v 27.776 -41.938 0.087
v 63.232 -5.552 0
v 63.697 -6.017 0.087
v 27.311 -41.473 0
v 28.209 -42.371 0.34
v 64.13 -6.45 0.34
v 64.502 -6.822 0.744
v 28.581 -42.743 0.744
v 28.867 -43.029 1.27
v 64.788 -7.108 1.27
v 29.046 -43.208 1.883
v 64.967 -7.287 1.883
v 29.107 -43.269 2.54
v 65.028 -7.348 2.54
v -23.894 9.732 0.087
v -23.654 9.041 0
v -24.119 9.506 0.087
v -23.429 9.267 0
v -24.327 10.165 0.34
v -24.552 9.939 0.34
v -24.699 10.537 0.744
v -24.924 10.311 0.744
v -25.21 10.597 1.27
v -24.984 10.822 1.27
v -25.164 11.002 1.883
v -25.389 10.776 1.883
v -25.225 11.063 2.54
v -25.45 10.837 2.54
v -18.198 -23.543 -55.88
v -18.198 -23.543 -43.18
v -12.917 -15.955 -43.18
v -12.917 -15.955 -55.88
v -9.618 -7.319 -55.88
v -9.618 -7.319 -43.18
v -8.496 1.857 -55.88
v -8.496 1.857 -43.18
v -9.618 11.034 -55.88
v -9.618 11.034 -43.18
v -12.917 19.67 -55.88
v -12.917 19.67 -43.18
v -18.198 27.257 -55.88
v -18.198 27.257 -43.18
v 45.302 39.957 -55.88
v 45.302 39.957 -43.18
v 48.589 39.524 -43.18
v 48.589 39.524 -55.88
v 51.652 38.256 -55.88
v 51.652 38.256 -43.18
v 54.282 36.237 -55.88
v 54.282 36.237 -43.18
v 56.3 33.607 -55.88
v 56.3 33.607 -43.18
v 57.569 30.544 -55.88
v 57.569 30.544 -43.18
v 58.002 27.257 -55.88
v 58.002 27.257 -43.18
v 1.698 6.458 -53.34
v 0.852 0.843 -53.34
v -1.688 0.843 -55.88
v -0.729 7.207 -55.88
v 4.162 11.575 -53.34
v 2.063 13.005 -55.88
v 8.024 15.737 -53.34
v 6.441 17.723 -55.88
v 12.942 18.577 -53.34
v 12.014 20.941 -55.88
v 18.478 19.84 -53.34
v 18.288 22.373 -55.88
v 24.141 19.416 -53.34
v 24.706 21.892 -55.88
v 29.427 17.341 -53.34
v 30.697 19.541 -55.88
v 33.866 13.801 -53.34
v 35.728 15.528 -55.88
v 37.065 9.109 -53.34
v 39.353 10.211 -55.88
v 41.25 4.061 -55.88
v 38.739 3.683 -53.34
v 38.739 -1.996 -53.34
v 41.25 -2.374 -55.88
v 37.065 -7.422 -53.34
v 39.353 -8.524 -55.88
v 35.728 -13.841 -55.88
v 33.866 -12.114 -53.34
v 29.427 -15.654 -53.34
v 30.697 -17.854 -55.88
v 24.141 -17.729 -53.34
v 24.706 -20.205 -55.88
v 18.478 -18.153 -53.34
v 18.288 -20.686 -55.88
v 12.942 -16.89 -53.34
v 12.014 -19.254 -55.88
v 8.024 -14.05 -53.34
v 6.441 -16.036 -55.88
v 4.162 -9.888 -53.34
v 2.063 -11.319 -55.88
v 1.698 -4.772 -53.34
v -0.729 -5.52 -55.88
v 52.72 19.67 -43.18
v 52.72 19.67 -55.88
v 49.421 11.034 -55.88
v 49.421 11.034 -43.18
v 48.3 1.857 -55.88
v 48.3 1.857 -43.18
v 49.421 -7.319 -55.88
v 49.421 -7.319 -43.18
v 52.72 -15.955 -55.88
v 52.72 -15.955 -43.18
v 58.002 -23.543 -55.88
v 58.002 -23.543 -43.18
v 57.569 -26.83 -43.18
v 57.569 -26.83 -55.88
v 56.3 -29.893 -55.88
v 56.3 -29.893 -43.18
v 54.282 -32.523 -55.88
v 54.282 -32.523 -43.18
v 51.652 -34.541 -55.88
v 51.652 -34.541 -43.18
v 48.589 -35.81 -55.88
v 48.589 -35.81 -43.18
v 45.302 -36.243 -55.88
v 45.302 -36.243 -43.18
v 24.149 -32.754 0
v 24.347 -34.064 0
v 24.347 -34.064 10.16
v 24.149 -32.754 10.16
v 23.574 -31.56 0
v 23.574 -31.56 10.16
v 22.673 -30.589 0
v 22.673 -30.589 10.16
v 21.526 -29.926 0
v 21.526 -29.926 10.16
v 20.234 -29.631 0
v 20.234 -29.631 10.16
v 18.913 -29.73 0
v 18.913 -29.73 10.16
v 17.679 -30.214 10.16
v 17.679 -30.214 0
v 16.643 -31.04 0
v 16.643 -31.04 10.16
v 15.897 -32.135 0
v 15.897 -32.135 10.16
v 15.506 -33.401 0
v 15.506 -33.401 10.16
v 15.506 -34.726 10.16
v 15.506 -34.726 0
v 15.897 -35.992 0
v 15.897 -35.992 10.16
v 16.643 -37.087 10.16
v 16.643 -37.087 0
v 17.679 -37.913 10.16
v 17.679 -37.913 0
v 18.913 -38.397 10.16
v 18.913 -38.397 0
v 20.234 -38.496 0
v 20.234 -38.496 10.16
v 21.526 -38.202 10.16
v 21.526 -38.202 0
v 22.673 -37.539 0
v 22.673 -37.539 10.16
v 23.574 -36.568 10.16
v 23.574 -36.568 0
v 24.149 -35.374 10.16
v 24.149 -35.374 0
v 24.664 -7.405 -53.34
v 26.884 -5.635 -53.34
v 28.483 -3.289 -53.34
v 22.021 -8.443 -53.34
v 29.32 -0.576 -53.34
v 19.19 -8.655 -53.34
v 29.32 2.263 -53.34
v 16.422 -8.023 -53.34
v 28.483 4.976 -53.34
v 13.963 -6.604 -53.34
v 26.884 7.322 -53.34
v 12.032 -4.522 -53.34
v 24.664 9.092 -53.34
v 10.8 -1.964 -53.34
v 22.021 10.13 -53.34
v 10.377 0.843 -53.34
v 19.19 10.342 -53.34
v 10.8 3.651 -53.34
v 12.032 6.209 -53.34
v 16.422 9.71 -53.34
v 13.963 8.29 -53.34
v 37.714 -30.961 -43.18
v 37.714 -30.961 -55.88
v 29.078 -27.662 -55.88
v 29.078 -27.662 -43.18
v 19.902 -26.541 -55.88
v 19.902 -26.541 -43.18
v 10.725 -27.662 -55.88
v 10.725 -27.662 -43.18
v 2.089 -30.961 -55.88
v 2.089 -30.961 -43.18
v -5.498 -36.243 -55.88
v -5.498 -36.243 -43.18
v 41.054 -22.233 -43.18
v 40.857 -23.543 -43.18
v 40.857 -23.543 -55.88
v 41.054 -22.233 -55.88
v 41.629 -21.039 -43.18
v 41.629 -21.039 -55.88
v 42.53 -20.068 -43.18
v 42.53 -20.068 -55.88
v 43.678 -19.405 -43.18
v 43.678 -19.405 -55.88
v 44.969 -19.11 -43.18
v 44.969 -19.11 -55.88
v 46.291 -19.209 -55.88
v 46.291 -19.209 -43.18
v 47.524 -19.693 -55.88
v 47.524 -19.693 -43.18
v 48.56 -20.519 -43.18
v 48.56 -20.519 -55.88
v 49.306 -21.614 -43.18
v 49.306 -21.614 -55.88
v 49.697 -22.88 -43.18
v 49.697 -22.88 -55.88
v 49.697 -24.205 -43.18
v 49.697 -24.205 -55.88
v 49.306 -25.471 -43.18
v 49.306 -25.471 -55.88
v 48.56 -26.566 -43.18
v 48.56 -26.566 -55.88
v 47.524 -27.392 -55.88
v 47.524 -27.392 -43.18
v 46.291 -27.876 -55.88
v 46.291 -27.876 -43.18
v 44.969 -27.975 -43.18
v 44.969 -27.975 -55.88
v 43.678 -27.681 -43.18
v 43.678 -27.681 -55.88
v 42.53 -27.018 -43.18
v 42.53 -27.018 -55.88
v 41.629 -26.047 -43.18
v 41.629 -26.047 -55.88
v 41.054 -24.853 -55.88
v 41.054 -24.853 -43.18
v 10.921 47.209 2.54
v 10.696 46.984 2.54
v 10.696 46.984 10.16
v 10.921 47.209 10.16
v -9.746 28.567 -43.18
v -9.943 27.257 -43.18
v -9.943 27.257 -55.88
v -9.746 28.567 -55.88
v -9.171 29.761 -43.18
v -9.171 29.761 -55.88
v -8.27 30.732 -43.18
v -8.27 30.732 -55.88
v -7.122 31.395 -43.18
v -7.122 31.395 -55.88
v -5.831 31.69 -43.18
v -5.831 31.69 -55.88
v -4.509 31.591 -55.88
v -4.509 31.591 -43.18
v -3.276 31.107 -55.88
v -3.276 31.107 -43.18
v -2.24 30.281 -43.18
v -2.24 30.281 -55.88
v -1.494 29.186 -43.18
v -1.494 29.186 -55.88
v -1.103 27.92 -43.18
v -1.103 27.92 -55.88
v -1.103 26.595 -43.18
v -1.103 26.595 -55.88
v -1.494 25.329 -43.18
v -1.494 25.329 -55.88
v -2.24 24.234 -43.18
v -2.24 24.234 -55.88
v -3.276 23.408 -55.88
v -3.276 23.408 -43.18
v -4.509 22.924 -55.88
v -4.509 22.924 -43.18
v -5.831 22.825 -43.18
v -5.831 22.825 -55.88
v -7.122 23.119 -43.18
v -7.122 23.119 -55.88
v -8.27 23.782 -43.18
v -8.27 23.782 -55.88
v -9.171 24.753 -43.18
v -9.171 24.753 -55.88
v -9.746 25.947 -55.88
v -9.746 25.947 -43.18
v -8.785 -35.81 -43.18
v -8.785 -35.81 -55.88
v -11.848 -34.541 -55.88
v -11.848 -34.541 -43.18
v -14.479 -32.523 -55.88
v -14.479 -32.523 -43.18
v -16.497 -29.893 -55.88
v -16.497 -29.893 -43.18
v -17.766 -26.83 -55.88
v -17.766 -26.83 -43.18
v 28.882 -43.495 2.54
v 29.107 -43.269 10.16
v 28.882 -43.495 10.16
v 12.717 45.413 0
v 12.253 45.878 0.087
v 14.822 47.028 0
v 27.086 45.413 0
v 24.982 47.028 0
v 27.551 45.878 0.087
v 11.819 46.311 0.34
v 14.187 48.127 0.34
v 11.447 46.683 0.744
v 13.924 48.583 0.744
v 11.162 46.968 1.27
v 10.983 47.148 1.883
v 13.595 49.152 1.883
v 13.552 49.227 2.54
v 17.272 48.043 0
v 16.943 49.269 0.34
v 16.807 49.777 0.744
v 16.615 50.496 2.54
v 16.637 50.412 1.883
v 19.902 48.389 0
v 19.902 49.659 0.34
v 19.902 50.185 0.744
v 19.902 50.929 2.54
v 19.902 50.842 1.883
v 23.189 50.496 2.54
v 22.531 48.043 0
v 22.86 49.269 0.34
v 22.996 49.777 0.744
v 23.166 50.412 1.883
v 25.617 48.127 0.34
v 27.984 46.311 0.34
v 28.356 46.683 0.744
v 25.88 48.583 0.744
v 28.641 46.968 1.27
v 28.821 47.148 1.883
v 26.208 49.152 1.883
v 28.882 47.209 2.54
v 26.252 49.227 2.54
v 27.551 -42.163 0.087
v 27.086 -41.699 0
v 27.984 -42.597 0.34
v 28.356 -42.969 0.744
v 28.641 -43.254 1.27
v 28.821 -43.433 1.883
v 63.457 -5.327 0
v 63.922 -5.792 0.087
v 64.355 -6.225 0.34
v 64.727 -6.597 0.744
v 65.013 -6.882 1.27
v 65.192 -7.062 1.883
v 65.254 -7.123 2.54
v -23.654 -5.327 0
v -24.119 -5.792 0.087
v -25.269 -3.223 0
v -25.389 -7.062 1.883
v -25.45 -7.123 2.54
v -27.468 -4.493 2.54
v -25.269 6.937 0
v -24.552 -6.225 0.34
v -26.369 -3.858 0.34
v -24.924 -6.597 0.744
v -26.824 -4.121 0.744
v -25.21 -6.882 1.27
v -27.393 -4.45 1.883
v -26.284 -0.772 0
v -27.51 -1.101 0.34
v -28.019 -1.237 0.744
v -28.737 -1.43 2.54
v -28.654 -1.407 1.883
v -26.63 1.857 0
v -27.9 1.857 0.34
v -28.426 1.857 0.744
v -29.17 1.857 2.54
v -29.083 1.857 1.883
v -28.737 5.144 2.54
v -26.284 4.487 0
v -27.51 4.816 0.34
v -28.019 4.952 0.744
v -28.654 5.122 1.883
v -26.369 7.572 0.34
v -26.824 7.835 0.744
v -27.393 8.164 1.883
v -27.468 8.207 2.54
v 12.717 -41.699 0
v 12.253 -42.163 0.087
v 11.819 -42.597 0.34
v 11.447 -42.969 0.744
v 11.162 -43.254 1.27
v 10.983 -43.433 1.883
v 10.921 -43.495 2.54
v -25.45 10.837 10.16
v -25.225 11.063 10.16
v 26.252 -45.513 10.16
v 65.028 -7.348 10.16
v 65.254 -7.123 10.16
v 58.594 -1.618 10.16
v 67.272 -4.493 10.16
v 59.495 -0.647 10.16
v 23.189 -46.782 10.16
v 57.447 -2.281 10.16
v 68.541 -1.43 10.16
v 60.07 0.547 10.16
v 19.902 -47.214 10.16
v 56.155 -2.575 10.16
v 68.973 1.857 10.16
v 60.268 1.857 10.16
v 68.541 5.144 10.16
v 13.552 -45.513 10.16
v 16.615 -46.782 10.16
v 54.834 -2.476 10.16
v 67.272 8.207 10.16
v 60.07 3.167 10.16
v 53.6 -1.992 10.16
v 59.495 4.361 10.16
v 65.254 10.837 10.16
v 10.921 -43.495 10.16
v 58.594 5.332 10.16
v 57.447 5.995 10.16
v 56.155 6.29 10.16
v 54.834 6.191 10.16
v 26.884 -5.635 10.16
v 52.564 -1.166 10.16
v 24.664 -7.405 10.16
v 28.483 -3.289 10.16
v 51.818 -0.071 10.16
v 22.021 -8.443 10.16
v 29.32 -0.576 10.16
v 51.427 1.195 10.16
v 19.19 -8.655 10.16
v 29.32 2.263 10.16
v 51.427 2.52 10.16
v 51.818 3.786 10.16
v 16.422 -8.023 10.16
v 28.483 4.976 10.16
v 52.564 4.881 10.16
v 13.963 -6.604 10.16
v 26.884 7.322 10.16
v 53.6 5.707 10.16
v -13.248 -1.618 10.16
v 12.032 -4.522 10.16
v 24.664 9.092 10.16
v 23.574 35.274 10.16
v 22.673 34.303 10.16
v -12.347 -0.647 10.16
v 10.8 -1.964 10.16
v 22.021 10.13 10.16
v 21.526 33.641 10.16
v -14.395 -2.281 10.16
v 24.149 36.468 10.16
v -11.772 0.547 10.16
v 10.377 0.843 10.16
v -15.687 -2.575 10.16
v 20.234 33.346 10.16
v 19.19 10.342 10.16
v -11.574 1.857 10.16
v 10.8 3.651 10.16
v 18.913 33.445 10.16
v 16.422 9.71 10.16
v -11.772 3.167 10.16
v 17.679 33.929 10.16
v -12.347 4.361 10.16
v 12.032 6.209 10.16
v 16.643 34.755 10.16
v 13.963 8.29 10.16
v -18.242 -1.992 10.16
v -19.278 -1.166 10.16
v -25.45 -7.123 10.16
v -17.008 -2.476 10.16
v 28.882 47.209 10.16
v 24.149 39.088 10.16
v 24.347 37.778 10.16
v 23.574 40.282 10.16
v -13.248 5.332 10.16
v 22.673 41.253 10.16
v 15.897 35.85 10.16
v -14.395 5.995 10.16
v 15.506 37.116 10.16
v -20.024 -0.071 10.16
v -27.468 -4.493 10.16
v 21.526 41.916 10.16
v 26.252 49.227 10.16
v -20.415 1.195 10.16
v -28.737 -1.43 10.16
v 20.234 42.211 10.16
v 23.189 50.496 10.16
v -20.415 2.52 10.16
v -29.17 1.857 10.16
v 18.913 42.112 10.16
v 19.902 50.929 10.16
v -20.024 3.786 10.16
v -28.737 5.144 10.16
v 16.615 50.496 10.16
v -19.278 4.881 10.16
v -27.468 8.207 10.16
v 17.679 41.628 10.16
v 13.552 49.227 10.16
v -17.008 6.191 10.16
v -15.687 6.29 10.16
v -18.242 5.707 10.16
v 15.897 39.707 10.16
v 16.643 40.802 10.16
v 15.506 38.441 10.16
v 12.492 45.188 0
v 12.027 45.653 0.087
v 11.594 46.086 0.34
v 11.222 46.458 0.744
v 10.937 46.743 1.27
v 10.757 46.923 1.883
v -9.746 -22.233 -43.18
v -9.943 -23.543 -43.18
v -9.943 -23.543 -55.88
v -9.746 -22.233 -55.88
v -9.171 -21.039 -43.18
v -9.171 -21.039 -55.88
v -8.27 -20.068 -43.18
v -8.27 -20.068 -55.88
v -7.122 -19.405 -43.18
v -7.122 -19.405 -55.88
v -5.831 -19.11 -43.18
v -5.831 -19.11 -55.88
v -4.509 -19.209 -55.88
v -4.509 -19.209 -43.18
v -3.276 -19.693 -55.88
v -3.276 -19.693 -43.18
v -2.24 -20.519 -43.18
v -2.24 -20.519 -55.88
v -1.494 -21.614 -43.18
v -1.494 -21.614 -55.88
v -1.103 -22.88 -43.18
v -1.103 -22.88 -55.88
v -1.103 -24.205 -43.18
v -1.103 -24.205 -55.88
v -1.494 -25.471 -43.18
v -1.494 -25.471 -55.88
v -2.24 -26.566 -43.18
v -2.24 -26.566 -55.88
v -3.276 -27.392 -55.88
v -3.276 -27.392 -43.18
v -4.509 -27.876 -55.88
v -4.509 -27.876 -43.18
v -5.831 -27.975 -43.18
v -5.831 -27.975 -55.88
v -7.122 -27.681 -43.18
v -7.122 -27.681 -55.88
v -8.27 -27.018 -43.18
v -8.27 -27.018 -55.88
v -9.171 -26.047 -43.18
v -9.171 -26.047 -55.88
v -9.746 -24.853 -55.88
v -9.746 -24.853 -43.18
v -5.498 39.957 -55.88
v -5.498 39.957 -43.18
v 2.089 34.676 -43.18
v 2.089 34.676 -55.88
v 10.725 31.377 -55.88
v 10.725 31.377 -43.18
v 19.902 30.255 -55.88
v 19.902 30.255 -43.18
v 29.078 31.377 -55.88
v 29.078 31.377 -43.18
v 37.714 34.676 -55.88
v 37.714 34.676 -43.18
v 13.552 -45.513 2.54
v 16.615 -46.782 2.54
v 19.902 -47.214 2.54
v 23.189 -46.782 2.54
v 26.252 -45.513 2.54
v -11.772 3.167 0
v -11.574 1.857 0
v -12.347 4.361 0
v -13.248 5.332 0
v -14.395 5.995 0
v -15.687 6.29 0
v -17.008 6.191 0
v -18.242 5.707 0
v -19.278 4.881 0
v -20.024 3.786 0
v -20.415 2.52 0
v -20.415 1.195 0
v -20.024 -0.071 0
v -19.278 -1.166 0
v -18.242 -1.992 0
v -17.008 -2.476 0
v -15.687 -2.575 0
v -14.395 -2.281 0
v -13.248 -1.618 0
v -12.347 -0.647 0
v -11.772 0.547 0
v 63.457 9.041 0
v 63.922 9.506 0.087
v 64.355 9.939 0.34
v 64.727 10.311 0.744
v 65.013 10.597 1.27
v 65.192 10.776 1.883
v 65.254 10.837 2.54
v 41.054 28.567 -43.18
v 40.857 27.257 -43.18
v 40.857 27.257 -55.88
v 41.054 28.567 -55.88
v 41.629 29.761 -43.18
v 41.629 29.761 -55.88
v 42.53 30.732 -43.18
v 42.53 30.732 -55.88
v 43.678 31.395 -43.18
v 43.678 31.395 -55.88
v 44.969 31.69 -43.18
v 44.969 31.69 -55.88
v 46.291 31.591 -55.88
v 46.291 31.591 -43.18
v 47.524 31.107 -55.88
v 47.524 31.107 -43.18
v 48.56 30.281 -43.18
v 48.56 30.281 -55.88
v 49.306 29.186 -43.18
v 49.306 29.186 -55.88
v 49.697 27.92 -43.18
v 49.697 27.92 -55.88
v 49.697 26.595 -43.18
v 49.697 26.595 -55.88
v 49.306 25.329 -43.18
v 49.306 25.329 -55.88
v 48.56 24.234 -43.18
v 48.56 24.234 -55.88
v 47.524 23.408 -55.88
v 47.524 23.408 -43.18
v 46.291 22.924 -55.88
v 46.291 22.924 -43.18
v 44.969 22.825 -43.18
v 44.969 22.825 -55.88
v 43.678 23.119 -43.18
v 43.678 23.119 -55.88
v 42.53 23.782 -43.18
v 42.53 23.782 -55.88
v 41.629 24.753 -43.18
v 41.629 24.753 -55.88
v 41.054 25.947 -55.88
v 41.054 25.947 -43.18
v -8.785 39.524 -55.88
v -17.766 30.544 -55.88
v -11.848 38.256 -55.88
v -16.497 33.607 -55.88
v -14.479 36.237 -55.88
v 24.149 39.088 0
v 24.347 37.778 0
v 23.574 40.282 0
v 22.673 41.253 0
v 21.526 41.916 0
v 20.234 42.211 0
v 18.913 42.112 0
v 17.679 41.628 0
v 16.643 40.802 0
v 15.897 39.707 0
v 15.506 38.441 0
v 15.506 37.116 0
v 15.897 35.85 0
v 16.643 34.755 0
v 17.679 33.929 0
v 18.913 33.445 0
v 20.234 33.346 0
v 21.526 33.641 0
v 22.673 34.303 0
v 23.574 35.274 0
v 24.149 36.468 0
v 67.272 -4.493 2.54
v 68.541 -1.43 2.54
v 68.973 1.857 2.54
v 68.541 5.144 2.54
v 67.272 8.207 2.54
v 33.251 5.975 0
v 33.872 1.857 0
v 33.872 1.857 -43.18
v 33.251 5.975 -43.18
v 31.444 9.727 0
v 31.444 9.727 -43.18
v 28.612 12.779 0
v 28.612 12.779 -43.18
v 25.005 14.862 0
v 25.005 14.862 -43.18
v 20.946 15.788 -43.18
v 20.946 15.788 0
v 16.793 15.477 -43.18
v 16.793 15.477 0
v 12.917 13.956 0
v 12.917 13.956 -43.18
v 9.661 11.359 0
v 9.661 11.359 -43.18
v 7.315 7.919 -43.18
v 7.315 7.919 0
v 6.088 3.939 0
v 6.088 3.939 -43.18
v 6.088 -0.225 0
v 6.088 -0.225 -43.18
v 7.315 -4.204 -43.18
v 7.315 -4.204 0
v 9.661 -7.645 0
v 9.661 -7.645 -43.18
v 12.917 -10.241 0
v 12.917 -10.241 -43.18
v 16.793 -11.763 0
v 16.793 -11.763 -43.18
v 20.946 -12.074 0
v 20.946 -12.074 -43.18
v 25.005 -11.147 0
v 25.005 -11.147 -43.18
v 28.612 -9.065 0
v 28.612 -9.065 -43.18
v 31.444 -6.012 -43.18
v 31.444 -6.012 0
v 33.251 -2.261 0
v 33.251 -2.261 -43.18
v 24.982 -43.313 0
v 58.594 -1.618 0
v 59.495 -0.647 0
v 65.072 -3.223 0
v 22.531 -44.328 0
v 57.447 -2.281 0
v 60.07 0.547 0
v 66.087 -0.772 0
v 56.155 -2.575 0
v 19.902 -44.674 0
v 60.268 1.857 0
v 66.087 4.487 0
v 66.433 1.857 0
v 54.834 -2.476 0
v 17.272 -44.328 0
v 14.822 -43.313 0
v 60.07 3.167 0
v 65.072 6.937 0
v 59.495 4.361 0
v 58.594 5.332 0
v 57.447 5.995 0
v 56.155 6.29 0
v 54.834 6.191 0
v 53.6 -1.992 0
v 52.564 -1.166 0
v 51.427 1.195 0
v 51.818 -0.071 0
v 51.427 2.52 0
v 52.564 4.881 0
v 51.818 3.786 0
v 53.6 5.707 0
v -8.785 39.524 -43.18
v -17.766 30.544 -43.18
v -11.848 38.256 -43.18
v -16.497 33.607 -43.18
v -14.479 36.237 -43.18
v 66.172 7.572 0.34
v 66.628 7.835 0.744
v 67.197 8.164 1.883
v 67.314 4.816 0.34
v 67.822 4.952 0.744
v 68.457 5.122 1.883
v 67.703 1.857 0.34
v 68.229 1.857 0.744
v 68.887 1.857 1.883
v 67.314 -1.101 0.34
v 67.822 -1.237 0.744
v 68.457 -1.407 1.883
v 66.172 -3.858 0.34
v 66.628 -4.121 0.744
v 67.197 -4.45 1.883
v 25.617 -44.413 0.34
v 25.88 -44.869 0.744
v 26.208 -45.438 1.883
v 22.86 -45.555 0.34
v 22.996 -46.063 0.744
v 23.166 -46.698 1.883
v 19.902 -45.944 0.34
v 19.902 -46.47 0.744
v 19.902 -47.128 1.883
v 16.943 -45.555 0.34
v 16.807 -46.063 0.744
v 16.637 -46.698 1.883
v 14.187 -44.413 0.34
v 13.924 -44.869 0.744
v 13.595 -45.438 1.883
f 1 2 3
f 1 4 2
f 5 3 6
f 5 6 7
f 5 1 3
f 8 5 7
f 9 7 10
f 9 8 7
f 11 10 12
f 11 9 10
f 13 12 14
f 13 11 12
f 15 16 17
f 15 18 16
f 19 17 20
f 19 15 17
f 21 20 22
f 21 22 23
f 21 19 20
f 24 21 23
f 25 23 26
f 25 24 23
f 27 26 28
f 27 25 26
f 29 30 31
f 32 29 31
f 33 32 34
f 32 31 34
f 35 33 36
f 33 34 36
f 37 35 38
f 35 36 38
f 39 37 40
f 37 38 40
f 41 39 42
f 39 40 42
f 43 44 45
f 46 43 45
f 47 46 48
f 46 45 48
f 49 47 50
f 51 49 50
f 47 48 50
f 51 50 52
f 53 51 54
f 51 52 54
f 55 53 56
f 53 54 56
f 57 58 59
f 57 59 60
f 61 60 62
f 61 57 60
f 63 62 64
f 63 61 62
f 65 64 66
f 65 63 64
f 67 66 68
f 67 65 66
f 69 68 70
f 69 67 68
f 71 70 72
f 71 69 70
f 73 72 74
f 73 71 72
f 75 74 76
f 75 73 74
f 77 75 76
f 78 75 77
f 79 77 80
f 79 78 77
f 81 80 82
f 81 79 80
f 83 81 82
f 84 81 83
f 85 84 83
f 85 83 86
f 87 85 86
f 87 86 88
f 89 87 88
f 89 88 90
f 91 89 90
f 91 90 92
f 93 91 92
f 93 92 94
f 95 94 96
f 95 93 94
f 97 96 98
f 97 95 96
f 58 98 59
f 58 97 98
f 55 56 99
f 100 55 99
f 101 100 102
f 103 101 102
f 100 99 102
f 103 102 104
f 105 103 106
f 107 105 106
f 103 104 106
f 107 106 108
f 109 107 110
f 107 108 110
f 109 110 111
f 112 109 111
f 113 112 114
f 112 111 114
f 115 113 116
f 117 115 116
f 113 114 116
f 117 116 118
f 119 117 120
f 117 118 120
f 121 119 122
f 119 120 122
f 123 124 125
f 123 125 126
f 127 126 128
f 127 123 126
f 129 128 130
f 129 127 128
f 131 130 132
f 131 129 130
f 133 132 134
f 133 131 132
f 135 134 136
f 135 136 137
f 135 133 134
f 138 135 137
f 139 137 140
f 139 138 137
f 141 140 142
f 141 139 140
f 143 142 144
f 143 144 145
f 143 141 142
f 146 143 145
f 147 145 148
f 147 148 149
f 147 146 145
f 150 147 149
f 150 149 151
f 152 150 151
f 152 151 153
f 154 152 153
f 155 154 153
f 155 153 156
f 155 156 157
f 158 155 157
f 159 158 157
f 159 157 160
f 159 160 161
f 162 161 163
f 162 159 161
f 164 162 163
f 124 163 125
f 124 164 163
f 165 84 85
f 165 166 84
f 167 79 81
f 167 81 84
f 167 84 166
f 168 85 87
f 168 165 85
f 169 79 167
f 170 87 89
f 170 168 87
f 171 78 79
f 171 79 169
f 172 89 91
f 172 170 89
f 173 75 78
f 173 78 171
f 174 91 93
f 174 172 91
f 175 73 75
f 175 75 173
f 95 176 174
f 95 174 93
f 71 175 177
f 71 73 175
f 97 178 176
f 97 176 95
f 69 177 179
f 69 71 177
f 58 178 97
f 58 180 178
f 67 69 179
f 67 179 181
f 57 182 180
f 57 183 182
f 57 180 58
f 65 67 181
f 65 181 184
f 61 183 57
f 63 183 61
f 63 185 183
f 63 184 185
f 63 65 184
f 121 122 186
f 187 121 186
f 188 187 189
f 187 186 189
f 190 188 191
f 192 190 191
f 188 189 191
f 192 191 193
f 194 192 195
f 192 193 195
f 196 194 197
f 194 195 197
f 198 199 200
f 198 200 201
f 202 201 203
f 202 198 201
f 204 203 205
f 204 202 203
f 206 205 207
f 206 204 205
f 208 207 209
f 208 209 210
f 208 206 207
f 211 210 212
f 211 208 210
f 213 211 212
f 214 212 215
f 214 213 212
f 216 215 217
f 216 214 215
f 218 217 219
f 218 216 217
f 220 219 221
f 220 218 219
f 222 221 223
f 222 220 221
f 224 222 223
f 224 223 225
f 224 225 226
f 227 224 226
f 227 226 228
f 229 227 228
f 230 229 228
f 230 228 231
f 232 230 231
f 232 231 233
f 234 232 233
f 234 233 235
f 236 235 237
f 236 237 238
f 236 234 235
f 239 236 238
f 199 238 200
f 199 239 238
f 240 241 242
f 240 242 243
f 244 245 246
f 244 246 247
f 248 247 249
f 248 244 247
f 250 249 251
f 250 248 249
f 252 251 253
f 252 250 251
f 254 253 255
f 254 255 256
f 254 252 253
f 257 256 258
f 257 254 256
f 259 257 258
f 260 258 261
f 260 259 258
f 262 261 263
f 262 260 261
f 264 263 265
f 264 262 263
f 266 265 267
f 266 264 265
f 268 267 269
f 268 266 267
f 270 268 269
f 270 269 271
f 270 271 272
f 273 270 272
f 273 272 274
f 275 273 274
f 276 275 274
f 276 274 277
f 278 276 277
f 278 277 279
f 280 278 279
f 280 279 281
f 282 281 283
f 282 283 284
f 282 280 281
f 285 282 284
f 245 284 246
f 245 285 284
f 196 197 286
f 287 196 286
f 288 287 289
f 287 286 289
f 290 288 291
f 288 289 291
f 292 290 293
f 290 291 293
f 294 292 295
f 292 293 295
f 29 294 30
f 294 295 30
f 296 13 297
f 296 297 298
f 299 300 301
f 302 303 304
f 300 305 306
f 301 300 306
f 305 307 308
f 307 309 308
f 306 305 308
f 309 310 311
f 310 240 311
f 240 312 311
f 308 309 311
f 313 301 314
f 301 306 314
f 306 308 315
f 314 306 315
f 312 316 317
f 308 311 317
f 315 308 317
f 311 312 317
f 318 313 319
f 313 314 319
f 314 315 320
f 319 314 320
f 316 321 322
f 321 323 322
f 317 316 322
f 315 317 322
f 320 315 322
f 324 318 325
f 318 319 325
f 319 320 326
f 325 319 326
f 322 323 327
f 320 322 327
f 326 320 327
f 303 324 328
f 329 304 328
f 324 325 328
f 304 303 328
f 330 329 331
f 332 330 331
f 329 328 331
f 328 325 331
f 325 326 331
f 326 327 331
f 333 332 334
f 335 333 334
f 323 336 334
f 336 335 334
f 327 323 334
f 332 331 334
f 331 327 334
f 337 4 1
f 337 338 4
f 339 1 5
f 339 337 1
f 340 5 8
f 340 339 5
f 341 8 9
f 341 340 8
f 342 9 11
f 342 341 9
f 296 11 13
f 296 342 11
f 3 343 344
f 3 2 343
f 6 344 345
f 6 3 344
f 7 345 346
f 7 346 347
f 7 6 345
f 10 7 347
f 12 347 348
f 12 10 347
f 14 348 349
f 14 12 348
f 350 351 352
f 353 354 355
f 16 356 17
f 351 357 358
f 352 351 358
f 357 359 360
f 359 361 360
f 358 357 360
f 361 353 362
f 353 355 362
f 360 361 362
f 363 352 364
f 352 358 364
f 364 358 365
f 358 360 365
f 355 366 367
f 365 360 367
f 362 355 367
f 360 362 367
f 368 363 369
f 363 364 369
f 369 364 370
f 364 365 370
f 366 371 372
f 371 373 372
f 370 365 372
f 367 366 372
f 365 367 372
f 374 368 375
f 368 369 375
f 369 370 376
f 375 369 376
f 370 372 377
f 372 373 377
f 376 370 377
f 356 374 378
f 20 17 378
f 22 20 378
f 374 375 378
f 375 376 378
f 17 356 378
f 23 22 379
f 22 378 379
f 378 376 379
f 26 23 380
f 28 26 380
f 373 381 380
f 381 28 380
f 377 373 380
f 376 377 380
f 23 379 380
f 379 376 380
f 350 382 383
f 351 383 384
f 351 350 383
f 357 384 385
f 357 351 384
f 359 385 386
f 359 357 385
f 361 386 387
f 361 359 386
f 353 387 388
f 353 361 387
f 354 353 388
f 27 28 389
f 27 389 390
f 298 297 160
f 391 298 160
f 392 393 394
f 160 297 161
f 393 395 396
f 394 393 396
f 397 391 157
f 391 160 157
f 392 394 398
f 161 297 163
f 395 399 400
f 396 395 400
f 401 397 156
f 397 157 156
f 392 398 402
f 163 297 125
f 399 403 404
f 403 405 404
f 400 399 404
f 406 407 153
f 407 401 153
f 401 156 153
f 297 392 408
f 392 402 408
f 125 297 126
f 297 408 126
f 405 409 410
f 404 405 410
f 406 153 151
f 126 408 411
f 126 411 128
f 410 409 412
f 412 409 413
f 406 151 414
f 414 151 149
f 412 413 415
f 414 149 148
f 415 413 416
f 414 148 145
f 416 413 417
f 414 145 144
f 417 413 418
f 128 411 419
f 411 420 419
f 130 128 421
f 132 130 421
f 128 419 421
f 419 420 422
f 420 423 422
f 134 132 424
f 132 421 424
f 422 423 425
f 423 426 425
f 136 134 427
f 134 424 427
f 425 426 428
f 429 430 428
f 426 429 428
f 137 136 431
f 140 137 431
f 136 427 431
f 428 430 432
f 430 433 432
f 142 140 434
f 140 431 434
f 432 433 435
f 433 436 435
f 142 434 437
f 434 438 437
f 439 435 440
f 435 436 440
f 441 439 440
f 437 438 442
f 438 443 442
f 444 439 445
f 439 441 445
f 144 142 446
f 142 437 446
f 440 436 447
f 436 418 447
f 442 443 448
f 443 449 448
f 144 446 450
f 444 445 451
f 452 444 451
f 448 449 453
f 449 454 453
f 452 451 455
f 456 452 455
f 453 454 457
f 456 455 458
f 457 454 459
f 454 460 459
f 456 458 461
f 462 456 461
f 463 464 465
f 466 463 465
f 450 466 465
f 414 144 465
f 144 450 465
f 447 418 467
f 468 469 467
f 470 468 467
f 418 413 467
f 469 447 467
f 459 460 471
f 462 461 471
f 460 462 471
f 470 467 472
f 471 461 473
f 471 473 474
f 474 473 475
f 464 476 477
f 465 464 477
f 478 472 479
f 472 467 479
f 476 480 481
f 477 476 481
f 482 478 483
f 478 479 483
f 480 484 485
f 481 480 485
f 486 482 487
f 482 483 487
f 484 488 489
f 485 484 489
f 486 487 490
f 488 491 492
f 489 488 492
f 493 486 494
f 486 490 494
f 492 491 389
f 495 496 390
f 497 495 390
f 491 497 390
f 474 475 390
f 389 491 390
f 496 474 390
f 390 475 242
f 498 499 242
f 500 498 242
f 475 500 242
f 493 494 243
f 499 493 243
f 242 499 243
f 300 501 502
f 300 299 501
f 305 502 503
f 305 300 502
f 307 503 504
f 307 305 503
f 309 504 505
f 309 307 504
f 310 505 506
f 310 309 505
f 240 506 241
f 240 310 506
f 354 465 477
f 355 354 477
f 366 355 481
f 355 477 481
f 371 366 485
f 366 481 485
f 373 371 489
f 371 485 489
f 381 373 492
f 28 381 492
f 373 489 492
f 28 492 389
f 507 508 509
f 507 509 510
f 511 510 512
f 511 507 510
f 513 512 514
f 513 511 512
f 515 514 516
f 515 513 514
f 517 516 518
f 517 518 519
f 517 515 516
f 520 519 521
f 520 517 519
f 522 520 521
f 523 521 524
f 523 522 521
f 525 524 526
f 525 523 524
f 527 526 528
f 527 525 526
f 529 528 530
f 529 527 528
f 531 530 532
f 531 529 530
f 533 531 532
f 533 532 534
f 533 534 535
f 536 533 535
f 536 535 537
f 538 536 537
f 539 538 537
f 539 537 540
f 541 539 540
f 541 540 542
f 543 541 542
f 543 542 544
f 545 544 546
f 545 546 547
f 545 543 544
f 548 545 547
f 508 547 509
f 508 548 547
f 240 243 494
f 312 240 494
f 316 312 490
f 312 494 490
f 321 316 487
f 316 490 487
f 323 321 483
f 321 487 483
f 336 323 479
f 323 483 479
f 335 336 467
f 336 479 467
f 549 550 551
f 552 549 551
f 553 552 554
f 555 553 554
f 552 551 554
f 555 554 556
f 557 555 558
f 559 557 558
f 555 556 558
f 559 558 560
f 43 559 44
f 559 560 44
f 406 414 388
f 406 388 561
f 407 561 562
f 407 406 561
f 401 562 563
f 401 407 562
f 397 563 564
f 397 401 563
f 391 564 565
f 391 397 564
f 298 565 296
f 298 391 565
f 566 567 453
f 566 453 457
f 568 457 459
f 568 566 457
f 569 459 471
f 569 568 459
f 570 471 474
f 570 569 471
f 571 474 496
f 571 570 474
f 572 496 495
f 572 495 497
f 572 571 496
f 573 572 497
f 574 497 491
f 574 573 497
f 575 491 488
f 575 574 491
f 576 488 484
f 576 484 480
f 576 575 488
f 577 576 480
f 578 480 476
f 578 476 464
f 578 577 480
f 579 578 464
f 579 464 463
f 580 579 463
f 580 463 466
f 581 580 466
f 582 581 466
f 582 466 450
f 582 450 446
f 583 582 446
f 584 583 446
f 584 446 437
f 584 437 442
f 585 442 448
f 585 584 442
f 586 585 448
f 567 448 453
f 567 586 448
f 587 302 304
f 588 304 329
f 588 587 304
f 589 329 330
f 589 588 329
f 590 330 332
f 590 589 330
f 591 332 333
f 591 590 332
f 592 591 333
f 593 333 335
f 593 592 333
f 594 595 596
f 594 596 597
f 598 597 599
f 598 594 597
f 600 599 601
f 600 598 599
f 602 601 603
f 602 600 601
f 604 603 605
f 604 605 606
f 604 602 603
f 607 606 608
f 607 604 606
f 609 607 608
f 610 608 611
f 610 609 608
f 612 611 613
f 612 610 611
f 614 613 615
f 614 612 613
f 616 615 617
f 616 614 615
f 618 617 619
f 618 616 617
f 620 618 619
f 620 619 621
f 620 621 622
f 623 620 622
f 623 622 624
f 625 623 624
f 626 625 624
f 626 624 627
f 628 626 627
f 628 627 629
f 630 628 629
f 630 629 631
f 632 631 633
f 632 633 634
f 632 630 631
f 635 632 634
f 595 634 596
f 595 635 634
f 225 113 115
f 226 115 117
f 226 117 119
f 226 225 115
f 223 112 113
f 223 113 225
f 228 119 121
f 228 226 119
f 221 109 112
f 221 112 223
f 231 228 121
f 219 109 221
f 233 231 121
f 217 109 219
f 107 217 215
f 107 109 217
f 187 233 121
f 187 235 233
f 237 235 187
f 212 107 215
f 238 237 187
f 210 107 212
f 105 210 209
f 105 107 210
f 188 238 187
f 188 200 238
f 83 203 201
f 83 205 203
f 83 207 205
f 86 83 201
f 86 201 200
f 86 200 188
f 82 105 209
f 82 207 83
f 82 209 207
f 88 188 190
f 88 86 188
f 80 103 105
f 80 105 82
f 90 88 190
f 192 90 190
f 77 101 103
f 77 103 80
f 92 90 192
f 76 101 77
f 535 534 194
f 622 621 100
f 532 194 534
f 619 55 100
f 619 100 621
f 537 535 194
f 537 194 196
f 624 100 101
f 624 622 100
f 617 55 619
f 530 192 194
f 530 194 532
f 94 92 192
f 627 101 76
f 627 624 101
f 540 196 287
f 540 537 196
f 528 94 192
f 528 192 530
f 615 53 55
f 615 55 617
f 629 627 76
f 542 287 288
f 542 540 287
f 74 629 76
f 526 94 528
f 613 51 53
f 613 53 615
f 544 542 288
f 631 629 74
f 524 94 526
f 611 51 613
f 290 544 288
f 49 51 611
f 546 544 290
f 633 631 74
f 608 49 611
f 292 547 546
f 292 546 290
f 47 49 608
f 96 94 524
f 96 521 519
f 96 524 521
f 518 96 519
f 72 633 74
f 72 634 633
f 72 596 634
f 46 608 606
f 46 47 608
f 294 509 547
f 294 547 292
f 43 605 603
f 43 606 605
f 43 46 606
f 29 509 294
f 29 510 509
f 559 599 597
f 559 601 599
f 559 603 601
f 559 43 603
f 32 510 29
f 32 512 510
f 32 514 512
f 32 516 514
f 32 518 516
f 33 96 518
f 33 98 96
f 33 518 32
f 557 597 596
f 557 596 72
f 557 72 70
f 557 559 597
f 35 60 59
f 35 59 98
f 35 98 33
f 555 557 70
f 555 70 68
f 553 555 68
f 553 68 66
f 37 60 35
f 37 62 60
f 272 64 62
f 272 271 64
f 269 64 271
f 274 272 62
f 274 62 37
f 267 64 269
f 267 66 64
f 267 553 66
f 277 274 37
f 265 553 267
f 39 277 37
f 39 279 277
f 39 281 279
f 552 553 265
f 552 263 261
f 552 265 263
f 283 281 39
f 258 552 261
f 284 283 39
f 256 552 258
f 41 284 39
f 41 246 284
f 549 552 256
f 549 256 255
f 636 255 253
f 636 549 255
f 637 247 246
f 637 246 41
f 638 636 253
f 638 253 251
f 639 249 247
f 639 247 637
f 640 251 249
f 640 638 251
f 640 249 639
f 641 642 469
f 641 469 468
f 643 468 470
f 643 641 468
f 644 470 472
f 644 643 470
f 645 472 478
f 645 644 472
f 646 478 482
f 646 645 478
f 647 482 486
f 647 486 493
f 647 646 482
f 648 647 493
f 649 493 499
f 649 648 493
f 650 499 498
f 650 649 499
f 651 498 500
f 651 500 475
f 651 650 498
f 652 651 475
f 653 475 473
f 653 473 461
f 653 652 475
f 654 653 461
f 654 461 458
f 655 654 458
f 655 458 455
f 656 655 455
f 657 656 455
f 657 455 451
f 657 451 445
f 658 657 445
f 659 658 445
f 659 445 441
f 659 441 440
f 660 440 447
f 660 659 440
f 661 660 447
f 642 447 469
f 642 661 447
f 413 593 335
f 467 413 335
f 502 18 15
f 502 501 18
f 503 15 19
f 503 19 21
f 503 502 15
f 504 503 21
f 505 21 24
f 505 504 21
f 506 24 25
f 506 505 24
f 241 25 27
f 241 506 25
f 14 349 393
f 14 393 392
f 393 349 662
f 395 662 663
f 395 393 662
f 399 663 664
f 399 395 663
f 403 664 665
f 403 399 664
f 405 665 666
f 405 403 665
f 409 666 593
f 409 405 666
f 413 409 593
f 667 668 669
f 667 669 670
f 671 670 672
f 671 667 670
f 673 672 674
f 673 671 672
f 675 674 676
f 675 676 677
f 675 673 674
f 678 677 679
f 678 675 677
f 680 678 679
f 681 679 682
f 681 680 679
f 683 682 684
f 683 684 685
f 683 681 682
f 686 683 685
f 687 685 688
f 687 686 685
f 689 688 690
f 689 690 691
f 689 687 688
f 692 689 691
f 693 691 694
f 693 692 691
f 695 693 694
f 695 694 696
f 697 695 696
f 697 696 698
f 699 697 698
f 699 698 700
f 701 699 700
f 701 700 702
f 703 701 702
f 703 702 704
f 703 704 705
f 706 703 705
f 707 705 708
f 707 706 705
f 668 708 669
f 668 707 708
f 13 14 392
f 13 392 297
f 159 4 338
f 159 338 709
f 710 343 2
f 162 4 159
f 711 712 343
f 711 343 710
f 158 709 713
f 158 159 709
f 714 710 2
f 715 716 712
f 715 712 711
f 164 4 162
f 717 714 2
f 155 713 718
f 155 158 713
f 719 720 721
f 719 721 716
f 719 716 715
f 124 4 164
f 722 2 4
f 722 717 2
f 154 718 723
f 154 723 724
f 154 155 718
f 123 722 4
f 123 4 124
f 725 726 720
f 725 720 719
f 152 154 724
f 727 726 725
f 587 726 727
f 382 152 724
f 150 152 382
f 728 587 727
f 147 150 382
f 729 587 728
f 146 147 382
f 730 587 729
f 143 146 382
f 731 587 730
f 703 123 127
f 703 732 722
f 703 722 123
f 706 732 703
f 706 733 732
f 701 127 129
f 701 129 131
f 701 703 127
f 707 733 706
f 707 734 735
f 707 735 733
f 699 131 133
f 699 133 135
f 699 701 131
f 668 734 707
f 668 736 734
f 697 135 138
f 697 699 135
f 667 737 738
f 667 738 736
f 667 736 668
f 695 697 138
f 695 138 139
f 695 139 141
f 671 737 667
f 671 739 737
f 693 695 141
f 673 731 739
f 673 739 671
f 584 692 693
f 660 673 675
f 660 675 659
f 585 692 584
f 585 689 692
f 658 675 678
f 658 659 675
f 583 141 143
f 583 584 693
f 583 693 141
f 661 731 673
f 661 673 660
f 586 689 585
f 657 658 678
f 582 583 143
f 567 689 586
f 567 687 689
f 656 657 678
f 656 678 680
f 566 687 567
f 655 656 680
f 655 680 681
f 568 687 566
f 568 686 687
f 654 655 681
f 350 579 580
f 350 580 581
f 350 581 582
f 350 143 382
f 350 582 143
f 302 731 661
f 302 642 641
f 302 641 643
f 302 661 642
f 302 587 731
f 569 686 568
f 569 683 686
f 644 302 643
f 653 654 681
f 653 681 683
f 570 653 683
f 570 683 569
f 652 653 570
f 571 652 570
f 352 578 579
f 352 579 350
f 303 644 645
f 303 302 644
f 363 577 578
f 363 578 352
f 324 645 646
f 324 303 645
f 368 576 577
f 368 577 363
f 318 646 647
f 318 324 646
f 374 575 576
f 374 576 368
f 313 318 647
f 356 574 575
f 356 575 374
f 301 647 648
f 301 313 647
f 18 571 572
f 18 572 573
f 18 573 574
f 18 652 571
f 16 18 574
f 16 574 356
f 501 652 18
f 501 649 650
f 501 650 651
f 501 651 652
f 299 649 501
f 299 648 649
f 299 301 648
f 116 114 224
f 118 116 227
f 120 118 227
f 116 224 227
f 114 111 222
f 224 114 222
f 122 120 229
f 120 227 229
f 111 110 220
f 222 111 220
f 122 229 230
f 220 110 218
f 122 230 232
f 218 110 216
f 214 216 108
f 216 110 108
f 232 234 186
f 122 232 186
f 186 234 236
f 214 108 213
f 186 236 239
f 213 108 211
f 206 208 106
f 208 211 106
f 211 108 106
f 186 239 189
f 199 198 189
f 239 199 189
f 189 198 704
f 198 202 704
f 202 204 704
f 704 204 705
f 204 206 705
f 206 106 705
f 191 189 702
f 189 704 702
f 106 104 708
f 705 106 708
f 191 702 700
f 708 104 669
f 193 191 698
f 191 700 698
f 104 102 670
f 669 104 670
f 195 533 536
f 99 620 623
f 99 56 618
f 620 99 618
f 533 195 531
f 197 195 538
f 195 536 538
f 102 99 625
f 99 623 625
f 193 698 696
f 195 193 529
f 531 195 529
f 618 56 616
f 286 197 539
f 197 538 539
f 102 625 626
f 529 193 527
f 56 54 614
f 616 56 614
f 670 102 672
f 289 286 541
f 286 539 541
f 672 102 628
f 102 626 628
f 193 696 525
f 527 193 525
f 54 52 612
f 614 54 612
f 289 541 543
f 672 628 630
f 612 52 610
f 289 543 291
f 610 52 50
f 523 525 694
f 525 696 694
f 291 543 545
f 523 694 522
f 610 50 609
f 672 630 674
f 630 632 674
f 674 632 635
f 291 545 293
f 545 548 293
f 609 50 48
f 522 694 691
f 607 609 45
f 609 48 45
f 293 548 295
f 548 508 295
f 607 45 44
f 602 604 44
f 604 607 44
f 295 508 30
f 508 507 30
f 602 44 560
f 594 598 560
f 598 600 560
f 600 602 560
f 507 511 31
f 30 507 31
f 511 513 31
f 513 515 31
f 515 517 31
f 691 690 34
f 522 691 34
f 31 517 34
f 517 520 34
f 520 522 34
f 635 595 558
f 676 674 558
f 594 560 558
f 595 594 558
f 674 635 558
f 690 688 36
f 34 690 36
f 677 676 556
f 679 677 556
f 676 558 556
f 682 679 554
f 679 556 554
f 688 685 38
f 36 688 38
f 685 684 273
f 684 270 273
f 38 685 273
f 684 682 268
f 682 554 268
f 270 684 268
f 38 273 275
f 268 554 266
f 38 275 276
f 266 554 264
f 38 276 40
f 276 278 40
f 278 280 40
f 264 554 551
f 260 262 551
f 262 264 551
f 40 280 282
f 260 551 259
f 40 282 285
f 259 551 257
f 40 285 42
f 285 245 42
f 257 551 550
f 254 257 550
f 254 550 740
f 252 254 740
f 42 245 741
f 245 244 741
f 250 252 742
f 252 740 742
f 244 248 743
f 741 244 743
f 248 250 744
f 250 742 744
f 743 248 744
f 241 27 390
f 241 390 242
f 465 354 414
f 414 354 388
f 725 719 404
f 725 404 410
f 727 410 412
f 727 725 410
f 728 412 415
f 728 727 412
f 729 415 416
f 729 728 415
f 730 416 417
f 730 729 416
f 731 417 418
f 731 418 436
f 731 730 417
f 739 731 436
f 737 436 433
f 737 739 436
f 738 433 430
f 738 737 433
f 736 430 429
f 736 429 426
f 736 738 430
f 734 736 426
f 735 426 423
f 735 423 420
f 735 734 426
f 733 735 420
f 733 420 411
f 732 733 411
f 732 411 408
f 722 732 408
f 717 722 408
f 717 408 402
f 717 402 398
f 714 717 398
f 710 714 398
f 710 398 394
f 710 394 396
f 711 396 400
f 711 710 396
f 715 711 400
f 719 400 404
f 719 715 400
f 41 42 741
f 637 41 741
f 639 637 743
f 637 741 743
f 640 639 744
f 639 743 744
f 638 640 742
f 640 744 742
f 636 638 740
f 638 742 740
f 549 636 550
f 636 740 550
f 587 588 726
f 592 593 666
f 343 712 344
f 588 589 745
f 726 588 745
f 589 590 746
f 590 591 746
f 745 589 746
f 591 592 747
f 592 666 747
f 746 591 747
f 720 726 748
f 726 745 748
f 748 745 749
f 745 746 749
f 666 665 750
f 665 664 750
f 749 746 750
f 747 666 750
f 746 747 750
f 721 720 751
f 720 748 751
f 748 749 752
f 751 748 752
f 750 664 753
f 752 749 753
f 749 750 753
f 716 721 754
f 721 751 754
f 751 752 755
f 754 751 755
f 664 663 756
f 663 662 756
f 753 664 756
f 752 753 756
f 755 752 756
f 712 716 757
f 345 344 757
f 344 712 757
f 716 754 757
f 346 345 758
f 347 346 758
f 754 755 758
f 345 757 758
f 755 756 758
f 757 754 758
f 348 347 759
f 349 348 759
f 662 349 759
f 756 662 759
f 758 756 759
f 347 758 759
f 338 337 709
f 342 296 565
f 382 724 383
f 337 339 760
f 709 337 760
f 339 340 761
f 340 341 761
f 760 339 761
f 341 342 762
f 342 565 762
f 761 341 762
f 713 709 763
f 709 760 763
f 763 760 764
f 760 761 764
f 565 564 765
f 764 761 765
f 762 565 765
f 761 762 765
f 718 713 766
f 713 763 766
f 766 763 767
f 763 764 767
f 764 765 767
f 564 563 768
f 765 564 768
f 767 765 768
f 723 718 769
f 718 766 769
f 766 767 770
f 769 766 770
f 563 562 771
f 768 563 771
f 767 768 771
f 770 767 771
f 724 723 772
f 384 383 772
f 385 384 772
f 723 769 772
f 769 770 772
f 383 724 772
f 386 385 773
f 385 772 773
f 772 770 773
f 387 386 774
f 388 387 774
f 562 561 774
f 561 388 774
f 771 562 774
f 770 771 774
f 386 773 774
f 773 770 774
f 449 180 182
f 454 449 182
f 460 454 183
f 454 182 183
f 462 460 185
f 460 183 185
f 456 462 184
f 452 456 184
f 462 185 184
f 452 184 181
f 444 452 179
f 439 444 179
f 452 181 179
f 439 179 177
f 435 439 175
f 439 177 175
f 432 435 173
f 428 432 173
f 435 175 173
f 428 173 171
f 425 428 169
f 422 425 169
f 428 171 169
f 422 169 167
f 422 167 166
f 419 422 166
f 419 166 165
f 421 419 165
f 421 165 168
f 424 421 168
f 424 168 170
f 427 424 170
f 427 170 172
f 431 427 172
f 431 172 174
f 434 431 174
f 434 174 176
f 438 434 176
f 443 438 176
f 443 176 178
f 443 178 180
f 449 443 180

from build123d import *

# Parameters (mm, degrees)
SKETCH1_R           = 4.445
BOSS_EXTRUDE1_DEPTH = 10.16
FILLET1_R           = 12.7
SKETCH2_R           = 13.97
BOSS_EXTRUDE2_DEPTH = 43.18
SKETCH4_R           = 4.445
BOSS_EXTRUDE3_DEPTH = 12.7
SKETCH5_R           = 9.525
CUT_EXTRUDE2_DEPTH  = 109.223551539
SKETCH6_R           = 19.05
CUT_EXTRUDE3_DEPTH  = 2.54
CHAMFER1_SIZE       = 2.54
FILLET2_R           = 2.54


with BuildPart() as part:
    # Sketch1 → Boss-Extrude1 (new body)
    with BuildSketch(Plane.XY):
        Polygon((10.696130127, -43.269340837), (-25.224894357, -7.348316353), (-34.430434771, 1.857224061), (-25.224894357, 11.062764475), (10.696130127, 46.98378896), (19.901670541, 56.189329374), (29.107210955, 46.98378896), (65.02823544, 11.062764475), (74.233775854, 1.857224061), (65.02823544, -7.348316353), (29.107210955, -43.269340837), (19.901670541, -52.474881251), align=None)
        with Locations((-16.019353943, 1.857224061)):
            Circle(SKETCH1_R, mode=Mode.SUBTRACT)
        with Locations((19.901670541, 37.778248545)):
            Circle(SKETCH1_R, mode=Mode.SUBTRACT)
        with Locations((19.901670541, -34.063800423)):
            Circle(SKETCH1_R, mode=Mode.SUBTRACT)
        with Locations((55.822695025, 1.857224061)):
            Circle(SKETCH1_R, mode=Mode.SUBTRACT)
    extrude(amount=BOSS_EXTRUDE1_DEPTH)

    # Fillet1
    fillet1_edges = [part.edges().sort_by_distance(p)[0] for p in [
        (-34.430434771, 1.857224061, 5.08),
        (19.901670541, 56.189329374, 5.08),
        (74.233775854, 1.857224061, 5.08),
        (19.901670541, -52.474881251, 5.08),
    ]]
    fillet(fillet1_edges, radius=FILLET1_R)

    # Sketch2 → Boss-Extrude2 (add)
    with BuildSketch(Plane.XY):
        with Locations((19.901670541, 1.857224061)):
            Circle(SKETCH2_R)
    extrude(amount=-BOSS_EXTRUDE2_DEPTH)

    # Sketch4 → Boss-Extrude3 (add)
    with BuildSketch(Plane(origin=(0, 0, -43.18), x_dir=(-1, 0, 0), z_dir=(0, 0, -1))):
        with BuildLine():
            ThreePointArc((-45.301670541, 39.957224061), (-54.281926662, 36.237480182), (-58.001670541, 27.257224061))
            ThreePointArc((-58.001670541, 27.257224061), (-48.299733855, 1.857224061), (-58.001670541, -23.542775939))
            ThreePointArc((-58.001670541, -23.542775939), (-54.281926662, -32.52303206), (-45.301670541, -36.242775939))
            ThreePointArc((-45.301670541, -36.242775939), (-19.901670541, -26.540839253), (5.498329459, -36.242775939))
            ThreePointArc((5.498329459, -36.242775939), (14.47858558, -32.52303206), (18.198329459, -23.542775939))
            ThreePointArc((18.198329459, -23.542775939), (8.496392773, 1.857224061), (18.198329459, 27.257224061))
            ThreePointArc((18.198329459, 27.257224061), (14.47858558, 36.237480182), (5.498329459, 39.957224061))
            ThreePointArc((5.498329459, 39.957224061), (-19.901670541, 30.255287375), (-45.301670541, 39.957224061))
        make_face()
        with Locations((-45.301670541, 27.257224061)):
            Circle(SKETCH4_R, mode=Mode.SUBTRACT)
        with Locations((5.498329459, 27.257224061)):
            Circle(SKETCH4_R, mode=Mode.SUBTRACT)
        with Locations((5.498329459, -23.542775939)):
            Circle(SKETCH4_R, mode=Mode.SUBTRACT)
        with Locations((-45.301670541, -23.542775939)):
            Circle(SKETCH4_R, mode=Mode.SUBTRACT)
    extrude(amount=BOSS_EXTRUDE3_DEPTH)

    # Sketch5 → Cut-Extrude2 (cut, through all)
    with BuildSketch(Plane(origin=(0, 0, -55.88), x_dir=(-1, 0, 0), z_dir=(0, 0, -1))):
        with Locations((-19.901670541, 0.843392699)):
            Circle(SKETCH5_R)
    extrude(amount=-CUT_EXTRUDE2_DEPTH, mode=Mode.SUBTRACT)

    # Sketch6 → Cut-Extrude3 (cut)
    with BuildSketch(Plane(origin=(0, 0, -55.88), x_dir=(-1, 0, 0), z_dir=(0, 0, -1))):
        with Locations((-19.901670541, 0.843392699)):
            Circle(SKETCH6_R)
    extrude(amount=-CUT_EXTRUDE3_DEPTH, mode=Mode.SUBTRACT)

    # Chamfer1
    chamfer1_edges = [part.edges().sort_by_distance(p)[0] for p in [
        (38.951670541, 0.843392699, -55.88),
    ]]
    chamfer(chamfer1_edges, length=CHAMFER1_SIZE - 0.0001)  # a hair under: the kernel refuses the full size

    # Fillet2
    fillet2_edges = [part.edges().sort_by_distance(p)[0] for p in [
        (47.067723198, -25.308828595, 0),
        (-7.264382115, -25.308828595, 0),
        (-7.264382115, 29.023276718, 0),
        (47.067723198, 29.023276718, 0),
        (19.901670541, 50.928817132, 0),
        (-29.169922529, 1.857224061, 0),
        (68.973263612, 1.857224061, 0),
        (19.901670541, -47.214369009, 0),
    ]]
    fillet(fillet2_edges, radius=FILLET2_R)


solid = part.part
